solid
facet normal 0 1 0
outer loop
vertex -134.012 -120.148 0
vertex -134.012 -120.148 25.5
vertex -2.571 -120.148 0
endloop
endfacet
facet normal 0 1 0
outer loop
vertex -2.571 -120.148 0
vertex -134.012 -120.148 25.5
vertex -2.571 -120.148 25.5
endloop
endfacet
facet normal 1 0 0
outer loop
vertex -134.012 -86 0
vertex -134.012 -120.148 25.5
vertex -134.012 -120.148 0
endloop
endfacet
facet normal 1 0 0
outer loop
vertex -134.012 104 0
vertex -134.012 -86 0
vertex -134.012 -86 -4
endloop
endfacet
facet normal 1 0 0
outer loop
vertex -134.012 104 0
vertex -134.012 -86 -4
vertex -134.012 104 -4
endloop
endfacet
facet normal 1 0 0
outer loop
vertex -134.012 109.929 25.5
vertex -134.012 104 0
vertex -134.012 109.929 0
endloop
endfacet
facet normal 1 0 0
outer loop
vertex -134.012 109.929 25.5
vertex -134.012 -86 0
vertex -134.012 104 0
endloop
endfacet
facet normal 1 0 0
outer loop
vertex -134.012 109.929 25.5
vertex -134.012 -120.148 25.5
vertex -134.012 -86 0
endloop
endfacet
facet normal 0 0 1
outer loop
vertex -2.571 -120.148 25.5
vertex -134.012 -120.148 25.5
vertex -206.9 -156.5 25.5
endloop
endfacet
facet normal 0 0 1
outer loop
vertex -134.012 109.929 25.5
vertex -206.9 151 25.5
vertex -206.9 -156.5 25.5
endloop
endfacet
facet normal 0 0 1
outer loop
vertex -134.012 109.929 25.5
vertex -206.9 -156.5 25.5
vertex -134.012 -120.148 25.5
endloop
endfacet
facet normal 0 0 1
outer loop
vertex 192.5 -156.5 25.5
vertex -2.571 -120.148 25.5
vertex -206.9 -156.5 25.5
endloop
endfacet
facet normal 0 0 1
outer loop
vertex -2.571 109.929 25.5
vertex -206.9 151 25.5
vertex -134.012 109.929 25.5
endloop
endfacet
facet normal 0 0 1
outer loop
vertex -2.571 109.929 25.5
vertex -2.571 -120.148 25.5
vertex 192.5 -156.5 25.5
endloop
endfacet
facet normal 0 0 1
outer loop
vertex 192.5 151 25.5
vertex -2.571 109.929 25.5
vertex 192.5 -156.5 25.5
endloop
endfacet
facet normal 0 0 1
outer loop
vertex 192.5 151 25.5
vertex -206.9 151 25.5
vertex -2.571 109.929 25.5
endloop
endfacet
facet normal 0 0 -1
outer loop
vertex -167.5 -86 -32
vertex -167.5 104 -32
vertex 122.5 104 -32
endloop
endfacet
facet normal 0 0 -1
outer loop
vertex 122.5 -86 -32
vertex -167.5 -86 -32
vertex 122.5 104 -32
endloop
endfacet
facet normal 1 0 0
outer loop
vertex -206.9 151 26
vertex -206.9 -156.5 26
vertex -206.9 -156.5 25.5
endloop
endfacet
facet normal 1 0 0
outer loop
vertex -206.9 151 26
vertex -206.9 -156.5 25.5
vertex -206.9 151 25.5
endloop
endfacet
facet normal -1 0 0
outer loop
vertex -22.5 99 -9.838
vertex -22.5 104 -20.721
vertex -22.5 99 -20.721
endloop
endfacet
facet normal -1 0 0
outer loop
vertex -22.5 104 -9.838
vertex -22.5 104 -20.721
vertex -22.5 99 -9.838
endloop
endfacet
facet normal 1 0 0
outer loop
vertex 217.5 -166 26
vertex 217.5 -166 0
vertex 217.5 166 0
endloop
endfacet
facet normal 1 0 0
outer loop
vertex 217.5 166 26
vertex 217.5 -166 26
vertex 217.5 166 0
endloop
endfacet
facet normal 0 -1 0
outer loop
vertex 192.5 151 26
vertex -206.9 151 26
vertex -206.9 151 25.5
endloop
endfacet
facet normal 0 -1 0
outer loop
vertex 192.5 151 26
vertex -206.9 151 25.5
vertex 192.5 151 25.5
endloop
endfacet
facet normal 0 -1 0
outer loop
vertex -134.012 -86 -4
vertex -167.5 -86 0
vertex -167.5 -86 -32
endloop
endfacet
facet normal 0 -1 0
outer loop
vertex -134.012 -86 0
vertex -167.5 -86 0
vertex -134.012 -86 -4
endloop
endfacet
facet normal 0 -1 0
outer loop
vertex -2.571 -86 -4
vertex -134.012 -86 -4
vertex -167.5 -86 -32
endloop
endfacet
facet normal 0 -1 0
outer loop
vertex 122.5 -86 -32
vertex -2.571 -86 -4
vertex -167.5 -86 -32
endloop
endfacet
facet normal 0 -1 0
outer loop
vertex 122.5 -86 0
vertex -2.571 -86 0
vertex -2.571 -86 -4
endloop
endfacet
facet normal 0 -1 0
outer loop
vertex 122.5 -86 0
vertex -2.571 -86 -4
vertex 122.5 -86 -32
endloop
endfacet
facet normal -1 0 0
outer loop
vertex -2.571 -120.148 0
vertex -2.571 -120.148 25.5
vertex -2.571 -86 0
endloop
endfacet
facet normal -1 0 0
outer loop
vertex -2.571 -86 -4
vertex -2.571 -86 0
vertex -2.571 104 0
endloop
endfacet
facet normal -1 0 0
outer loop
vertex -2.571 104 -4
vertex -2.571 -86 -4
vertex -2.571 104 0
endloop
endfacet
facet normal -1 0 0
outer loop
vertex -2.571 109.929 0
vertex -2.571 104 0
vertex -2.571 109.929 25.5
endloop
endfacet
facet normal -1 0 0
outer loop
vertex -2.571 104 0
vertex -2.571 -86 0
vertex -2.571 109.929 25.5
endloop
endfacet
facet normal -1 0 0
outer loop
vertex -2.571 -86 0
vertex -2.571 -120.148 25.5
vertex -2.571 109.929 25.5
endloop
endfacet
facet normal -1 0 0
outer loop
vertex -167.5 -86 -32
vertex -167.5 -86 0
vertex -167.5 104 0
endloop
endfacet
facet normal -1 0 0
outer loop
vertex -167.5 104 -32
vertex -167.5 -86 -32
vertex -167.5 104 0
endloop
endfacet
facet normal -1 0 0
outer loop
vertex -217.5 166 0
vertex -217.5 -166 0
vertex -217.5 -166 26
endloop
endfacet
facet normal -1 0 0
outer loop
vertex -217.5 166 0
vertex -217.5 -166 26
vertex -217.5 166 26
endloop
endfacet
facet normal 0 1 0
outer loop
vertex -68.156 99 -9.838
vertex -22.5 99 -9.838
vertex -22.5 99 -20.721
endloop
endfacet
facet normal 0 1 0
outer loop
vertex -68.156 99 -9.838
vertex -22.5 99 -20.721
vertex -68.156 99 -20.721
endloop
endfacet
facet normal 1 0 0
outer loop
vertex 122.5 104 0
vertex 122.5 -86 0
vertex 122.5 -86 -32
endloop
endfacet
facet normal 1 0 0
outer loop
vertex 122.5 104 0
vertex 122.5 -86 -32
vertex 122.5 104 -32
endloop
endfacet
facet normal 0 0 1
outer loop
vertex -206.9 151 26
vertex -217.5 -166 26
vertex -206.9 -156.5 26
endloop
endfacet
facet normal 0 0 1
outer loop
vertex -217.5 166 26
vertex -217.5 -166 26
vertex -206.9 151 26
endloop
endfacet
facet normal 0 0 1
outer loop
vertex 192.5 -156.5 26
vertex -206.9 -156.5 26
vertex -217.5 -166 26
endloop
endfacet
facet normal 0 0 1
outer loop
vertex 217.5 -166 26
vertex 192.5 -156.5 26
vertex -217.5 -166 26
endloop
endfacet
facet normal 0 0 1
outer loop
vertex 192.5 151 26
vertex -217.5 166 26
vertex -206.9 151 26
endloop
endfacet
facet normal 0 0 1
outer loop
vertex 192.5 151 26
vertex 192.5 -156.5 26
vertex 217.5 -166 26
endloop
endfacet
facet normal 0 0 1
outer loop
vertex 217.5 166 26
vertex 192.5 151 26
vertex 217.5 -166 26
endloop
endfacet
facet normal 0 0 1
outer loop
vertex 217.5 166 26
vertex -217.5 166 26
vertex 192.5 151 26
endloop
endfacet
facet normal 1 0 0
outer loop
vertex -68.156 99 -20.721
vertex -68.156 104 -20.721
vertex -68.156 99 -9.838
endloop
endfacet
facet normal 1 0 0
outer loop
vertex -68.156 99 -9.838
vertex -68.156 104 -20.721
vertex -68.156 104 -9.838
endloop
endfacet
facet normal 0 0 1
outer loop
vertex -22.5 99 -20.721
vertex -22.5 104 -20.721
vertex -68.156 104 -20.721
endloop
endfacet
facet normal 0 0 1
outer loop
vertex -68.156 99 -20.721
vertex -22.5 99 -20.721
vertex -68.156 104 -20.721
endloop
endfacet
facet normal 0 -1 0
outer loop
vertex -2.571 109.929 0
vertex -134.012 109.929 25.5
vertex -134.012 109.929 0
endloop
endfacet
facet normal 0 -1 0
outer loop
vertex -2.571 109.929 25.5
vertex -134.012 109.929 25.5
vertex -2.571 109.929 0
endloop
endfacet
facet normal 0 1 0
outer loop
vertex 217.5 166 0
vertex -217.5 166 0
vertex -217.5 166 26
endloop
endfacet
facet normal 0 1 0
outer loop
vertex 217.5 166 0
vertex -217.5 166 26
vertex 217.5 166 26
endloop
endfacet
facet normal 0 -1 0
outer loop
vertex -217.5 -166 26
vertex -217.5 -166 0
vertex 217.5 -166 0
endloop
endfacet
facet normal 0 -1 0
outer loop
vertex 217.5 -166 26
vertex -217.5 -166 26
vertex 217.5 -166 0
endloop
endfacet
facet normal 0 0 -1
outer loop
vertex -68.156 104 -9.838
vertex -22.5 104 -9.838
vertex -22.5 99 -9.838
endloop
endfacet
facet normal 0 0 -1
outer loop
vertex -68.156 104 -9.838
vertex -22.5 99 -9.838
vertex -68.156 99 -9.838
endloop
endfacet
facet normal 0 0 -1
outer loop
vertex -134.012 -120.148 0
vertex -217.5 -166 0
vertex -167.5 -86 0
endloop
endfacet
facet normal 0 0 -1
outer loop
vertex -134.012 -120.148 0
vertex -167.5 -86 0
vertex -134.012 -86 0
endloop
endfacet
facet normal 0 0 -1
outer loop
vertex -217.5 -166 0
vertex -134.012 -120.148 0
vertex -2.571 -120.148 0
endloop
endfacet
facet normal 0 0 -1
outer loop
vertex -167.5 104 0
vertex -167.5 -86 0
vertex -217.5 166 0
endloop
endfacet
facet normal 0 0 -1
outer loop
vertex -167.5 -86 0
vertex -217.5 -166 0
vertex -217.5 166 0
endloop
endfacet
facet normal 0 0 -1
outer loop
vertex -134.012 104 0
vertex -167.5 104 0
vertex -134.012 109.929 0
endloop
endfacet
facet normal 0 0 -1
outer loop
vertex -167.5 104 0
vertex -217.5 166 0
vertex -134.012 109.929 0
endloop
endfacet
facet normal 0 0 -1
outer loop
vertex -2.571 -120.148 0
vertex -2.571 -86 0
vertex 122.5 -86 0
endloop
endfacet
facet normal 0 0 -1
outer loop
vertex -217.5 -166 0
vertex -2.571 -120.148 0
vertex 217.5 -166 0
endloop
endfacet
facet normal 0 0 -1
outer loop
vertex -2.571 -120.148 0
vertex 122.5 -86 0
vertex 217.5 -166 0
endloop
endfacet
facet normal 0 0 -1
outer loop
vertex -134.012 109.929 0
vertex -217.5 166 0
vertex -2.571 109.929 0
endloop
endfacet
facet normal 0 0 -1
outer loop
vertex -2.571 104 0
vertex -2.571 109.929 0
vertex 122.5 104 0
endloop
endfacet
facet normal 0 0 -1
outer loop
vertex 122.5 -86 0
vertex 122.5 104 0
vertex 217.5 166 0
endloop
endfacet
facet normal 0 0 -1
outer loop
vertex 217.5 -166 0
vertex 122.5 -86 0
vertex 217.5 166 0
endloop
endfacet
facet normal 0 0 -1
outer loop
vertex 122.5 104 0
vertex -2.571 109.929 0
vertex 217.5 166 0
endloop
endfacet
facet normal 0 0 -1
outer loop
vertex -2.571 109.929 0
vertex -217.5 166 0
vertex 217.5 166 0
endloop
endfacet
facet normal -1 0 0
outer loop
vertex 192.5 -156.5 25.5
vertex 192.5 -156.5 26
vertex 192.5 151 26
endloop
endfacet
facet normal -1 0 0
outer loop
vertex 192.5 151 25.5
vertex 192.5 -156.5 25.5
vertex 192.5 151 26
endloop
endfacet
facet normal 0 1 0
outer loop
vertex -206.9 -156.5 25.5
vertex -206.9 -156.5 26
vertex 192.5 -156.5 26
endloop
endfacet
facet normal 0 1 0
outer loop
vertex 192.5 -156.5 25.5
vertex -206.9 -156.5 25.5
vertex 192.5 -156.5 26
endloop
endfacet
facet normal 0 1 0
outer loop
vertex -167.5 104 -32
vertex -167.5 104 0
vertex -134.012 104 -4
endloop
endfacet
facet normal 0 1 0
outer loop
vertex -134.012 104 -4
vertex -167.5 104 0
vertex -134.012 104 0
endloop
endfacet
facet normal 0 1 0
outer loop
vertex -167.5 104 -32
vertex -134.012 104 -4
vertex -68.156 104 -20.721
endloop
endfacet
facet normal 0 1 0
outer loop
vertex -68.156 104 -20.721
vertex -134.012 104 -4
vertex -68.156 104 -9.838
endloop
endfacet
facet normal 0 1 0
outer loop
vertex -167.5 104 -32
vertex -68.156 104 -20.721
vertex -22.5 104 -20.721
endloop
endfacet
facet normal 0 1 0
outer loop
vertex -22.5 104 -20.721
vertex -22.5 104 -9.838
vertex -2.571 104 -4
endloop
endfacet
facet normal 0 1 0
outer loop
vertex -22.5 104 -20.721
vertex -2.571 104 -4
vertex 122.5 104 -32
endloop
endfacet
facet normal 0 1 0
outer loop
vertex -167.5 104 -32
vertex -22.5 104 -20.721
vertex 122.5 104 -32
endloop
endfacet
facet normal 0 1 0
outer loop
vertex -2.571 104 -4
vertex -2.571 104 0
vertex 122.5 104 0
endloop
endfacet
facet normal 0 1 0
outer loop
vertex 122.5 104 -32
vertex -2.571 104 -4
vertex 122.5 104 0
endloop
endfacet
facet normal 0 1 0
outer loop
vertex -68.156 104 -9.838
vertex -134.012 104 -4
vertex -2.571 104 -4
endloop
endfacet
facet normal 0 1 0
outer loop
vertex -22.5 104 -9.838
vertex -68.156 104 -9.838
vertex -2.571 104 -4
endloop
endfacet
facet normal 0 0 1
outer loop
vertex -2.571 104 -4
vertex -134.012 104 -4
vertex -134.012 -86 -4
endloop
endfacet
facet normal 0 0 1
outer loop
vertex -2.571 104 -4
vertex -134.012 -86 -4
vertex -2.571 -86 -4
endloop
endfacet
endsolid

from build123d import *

# Parameters (mm, degrees)
F0_W     = 435
F0_H     = 332
F1_DEPTH = 26
F2_W     = 399.4
F2_H     = 307.5
F3_DEPTH = 0.5
F4_W     = 290
F4_H     = 190
F5_DEPTH = 32
F6_W     = 45.65622
F6_H     = 10.88232
F7_DEPTH = 5
F8_W     = 131.441295
F8_H     = 230.077163
F9_DEPTH = 30


with BuildPart() as f1:
    # F0 (on Top) → F1 (new body)
    with BuildSketch(Plane.XY):
        Rectangle(F0_W, F0_H)
    extrude(amount=F1_DEPTH)

    # F2 (on face) → F3 (cut)
    with BuildSketch(Plane.XY.offset(26)):
        with Locations((-7.2, -2.75)):
            Rectangle(F2_W, F2_H)
    extrude(amount=-F3_DEPTH, mode=Mode.SUBTRACT)

    # F4 (on face) → F5 (join)
    with BuildSketch(Plane.XY):
        with Locations((-22.5, 9)):
            Rectangle(F4_W, F4_H)
    extrude(amount=-F5_DEPTH)

    # F6 (on face) → F7 (cut)
    with BuildSketch(Plane(origin=(0, 104, 0), x_dir=(-1, 0, 0), z_dir=(0, 1, 0))):
        with Locations((45.32811, -15.279424)):
            Rectangle(F6_W, F6_H)
    extrude(amount=-F7_DEPTH, mode=Mode.SUBTRACT)

    # F8 (on face) → F9 (cut)
    with BuildSketch(Plane.XY.offset(26)):
        with Locations((-68.291783, -5.109631)):
            Rectangle(F8_W, F8_H)
    extrude(amount=-F9_DEPTH, mode=Mode.SUBTRACT)


solid = f1.part
